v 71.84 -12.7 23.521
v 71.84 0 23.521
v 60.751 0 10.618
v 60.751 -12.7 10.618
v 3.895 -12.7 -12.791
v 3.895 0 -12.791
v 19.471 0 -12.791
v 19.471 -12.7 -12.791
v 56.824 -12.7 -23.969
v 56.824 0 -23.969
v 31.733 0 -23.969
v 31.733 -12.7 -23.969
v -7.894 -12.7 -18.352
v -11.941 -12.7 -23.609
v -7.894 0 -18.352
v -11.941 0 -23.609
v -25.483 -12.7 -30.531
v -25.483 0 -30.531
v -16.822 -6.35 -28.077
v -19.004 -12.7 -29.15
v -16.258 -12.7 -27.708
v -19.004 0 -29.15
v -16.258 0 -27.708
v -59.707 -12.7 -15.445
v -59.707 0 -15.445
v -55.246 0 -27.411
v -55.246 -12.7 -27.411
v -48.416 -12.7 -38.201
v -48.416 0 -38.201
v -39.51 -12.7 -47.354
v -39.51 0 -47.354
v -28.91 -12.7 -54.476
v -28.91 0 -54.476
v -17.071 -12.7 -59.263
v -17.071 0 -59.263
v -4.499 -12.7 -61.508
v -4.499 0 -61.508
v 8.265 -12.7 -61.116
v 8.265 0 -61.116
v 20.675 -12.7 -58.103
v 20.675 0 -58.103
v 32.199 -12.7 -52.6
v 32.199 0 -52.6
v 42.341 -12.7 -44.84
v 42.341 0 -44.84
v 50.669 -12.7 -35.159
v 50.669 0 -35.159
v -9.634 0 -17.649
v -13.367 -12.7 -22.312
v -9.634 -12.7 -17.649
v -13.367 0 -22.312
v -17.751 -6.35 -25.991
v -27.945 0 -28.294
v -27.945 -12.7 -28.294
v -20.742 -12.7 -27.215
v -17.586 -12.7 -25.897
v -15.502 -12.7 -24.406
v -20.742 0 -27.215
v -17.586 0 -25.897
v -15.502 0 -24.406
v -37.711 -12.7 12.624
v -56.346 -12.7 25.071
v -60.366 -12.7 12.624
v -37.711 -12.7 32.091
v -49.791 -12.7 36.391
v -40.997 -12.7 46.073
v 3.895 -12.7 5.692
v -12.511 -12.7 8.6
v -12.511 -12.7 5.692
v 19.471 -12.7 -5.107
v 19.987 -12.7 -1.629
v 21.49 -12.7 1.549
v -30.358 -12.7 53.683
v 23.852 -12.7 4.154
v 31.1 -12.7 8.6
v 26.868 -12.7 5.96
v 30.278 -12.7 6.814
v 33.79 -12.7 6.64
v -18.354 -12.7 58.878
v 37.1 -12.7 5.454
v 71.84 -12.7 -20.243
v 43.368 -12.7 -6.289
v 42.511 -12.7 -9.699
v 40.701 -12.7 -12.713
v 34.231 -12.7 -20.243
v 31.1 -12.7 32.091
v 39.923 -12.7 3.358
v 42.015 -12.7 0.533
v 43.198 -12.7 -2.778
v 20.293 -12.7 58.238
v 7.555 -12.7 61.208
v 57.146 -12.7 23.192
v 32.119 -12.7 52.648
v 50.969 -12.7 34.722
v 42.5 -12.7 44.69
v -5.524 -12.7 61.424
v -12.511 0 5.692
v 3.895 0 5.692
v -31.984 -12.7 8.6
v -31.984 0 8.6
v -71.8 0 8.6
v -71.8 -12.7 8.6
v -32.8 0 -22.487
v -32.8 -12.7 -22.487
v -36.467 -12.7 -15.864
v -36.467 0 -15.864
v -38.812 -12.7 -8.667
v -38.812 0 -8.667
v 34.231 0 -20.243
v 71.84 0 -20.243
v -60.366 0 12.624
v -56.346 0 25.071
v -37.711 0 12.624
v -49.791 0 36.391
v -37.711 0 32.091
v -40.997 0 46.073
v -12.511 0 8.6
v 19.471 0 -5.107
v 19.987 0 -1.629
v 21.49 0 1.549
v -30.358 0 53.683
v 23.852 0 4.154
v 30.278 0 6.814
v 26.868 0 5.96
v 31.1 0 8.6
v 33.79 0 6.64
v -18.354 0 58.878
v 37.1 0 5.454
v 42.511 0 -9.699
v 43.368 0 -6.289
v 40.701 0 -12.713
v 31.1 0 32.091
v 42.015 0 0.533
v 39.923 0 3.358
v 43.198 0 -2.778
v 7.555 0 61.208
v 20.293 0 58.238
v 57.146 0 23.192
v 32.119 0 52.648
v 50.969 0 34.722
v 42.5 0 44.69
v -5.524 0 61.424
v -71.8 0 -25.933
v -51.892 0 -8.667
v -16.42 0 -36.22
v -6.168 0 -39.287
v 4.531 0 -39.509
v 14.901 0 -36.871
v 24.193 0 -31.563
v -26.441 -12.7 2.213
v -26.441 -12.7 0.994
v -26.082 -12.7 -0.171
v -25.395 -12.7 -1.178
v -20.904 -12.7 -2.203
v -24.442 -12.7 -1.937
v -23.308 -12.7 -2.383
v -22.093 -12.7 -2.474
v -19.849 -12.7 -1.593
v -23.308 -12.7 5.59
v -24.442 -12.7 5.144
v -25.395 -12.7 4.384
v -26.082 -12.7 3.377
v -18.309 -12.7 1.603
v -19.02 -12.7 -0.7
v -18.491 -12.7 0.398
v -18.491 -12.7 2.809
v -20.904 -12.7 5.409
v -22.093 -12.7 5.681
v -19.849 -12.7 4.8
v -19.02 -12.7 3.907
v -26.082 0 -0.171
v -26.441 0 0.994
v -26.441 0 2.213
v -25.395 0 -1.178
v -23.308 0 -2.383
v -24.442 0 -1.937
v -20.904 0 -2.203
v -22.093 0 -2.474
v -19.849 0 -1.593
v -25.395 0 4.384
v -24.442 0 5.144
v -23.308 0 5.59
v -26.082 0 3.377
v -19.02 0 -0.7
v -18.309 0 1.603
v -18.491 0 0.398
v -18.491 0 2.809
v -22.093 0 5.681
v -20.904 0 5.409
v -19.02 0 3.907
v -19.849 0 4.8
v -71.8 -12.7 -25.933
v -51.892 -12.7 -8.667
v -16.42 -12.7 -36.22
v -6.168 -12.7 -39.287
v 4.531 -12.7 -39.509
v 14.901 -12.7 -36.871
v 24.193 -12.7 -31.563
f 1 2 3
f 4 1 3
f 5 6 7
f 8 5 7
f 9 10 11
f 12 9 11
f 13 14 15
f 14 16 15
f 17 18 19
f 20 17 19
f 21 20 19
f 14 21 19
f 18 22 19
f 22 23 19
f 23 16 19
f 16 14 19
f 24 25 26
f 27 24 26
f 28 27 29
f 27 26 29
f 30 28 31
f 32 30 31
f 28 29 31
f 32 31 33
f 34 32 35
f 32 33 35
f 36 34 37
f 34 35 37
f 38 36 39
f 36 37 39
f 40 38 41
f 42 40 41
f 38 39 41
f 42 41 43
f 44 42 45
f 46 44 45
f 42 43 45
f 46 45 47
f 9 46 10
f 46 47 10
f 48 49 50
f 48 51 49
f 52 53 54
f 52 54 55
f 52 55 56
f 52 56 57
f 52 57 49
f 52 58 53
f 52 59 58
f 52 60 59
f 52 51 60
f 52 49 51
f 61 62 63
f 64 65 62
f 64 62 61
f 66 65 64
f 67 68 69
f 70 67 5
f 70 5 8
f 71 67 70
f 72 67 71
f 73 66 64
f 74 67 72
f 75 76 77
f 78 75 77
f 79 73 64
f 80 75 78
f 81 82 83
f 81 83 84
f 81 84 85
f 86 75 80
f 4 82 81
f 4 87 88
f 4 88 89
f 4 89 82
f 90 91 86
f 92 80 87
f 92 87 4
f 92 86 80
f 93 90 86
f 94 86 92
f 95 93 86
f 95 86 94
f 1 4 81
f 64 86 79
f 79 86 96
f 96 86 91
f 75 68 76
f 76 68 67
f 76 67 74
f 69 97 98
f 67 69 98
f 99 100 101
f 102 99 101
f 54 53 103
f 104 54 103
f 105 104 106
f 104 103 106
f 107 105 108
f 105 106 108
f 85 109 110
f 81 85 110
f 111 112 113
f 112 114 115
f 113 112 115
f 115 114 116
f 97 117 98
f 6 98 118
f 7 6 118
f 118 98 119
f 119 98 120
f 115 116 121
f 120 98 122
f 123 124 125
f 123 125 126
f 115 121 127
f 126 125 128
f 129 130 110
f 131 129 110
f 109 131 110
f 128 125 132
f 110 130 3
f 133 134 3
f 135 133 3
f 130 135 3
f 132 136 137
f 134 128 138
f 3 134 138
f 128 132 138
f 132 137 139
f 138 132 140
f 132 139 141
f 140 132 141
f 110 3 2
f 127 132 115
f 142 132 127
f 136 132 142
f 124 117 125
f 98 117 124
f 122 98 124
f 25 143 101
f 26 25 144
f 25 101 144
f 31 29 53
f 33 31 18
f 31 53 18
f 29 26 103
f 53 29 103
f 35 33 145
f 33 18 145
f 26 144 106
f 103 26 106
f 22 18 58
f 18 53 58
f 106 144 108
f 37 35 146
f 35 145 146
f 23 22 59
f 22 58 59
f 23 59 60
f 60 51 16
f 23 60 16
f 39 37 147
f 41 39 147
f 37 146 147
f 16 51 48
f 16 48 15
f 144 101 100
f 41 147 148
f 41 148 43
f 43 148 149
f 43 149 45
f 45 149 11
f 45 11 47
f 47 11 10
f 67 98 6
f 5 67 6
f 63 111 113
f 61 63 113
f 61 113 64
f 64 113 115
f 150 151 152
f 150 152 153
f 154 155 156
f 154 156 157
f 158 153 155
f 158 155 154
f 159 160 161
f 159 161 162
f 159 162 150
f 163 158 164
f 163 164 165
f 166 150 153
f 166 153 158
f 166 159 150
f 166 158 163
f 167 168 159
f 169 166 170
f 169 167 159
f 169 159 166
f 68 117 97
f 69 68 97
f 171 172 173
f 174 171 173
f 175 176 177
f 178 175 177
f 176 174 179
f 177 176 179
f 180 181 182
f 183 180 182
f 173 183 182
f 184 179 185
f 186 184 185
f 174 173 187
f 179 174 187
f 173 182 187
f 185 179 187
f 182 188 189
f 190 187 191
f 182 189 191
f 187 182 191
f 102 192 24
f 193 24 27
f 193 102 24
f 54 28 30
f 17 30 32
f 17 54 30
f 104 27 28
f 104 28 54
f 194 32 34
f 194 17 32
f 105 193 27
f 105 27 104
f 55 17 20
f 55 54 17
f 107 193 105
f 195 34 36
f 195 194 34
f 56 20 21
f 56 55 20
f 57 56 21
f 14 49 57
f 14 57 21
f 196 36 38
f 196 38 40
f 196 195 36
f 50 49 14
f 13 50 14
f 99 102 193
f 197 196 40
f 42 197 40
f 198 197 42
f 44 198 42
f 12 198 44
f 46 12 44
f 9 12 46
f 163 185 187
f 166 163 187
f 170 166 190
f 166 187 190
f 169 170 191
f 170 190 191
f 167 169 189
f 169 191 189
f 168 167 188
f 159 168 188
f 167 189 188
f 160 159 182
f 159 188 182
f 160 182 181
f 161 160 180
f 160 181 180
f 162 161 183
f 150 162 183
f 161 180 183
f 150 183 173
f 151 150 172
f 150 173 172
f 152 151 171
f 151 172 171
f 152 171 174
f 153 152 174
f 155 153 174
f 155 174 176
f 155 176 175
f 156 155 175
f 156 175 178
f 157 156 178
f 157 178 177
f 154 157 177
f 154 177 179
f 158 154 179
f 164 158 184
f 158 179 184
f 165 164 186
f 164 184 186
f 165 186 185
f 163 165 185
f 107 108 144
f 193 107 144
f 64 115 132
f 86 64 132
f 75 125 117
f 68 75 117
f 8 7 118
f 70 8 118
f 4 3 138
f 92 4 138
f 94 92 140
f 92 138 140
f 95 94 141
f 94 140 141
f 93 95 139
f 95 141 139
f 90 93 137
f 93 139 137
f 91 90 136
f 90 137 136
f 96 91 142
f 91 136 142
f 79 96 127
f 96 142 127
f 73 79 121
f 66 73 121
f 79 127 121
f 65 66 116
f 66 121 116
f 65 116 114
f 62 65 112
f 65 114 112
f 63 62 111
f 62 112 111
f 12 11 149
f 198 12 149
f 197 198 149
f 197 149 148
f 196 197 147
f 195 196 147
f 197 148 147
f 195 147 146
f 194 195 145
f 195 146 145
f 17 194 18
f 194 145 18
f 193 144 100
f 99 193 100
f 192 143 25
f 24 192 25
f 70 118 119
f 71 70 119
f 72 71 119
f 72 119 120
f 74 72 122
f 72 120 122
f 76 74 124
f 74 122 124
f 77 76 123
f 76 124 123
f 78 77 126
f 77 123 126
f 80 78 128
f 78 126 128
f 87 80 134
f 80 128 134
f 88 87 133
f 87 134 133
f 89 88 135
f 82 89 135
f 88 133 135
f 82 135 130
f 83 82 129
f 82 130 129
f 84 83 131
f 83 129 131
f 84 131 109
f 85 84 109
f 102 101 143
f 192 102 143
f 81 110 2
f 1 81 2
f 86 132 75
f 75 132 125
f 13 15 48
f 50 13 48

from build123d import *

# Parameters (mm, degrees)
F1_DEPTH = 12.7
F0_R     = 4.0886647845


with BuildPart() as f1:
    # F0 (on Front) → F1 (new body)
    with BuildSketch(Plane.XZ):
        with BuildLine():
            Line((71.8398294281, 23.5212235802), (60.751299087, 10.6180520119))
            ThreePointArc((60.751299087, 10.6180520119), (1.0213035563, 61.6637681976), (-60.3663526215, 12.6240580027))
            Line((-60.3663526215, 12.6240580027), (-37.7112602494, 12.6240580027))
            Line((-37.7112602494, 12.6240580027), (-37.7112602494, 32.0908278227))
            Line((-37.7112602494, 32.0908278227), (31.1002338197, 32.0908278227))
            Line((31.1002338197, 32.0908278227), (31.1002338197, 8.5995349878))
            Line((31.1002338197, 8.5995349878), (-12.5109853331, 8.5995349878))
            Line((-12.5109853331, 8.5995349878), (-12.5109853331, 5.6921191359))
            Line((-12.5109853331, 5.6921191359), (3.8951400559, 5.6921191359))
            Line((3.8951400559, 5.6921191359), (3.8951400559, -12.790729866))
            Line((3.8951400559, -12.790729866), (19.4705741372, -12.790729866))
            Line((19.4705741372, -12.790729866), (19.4705741372, -5.1068487732))
            ThreePointArc((19.4705741372, -5.1068487732), (35.4884527542, 6.1691779677), (40.7011304119, -12.7133326199))
            Line((40.7011304119, -12.7133326199), (34.2307118886, -20.2426370233))
            Line((34.2307118886, -20.2426370233), (71.8398294281, -20.2426370233))
            Line((71.8398294281, -20.2426370233), (71.8398294281, 23.5212235802))
        make_face()
    extrude(amount=F1_DEPTH)


with BuildPart() as f1b:
    # F0 (on Front) → F1, piece 2 (new body)
    with BuildSketch(Plane.XZ):
        with BuildLine():
            ThreePointArc((-27.9451449198, -28.2944317042), (-34.7914894942, -19.2628722893), (-38.8122544574, -8.6668849069))
            Line((-38.8122544574, -8.6668849069), (-51.8921427429, -8.6668849069))
            Line((-51.8921427429, -8.6668849069), (-31.9842025638, 8.5995349878))
            Line((-31.9842025638, 8.5995349878), (-71.800082922, 8.5995349878))
            Line((-71.800082922, 8.5995349878), (-71.800082922, -25.9333048016))
            Line((-71.800082922, -25.9333048016), (-59.7069674495, -15.4447857632))
            ThreePointArc((-59.7069674495, -15.4447857632), (-4.4994341074, -61.5078731708), (56.8237446806, -23.9692596832))
            Line((56.8237446806, -23.9692596832), (31.7329573204, -23.9692596832))
            ThreePointArc((31.7329573204, -23.9692596832), (4.5307735891, -39.509215137), (-25.4831119664, -30.530591127))
            add(Edge.make_bspline(
                [(-25.4831119664, -30.530591127), (-22.5052010071, -30.1433016085), (-15.8977890934, -29.2485495889), (-10.726291414, -22.2105711575), (-7.8940121457, -18.352009356)],
                knots=[0, 0, 0, 0, 0.4522755774, 1, 1, 1, 1], degree=3))
            Line((-7.8940121457, -18.352009356), (-9.633667767, -17.6485516131))
            add(Edge.make_bspline(
                [(-27.9451449198, -28.2944317042), (-24.3513194246, -27.9903303237), (-16.939122406, -27.3313255858), (-12.112270726, -20.9352883588), (-9.633667767, -17.6485516131)],
                knots=[0, 0, 0, 0, 0.4865453814, 1, 1, 1, 1], degree=3))
        make_face()
    extrude(amount=F1_DEPTH)


with BuildPart() as f1c:
    # F0 (on Front) → F1, piece 3 (new body)
    with BuildSketch(Plane.XZ):
        with Locations((-22.3980676383, 1.6034543514)):
            Circle(F0_R)
    extrude(amount=F1_DEPTH)


solid = Compound([f1.part, f1b.part, f1c.part])
